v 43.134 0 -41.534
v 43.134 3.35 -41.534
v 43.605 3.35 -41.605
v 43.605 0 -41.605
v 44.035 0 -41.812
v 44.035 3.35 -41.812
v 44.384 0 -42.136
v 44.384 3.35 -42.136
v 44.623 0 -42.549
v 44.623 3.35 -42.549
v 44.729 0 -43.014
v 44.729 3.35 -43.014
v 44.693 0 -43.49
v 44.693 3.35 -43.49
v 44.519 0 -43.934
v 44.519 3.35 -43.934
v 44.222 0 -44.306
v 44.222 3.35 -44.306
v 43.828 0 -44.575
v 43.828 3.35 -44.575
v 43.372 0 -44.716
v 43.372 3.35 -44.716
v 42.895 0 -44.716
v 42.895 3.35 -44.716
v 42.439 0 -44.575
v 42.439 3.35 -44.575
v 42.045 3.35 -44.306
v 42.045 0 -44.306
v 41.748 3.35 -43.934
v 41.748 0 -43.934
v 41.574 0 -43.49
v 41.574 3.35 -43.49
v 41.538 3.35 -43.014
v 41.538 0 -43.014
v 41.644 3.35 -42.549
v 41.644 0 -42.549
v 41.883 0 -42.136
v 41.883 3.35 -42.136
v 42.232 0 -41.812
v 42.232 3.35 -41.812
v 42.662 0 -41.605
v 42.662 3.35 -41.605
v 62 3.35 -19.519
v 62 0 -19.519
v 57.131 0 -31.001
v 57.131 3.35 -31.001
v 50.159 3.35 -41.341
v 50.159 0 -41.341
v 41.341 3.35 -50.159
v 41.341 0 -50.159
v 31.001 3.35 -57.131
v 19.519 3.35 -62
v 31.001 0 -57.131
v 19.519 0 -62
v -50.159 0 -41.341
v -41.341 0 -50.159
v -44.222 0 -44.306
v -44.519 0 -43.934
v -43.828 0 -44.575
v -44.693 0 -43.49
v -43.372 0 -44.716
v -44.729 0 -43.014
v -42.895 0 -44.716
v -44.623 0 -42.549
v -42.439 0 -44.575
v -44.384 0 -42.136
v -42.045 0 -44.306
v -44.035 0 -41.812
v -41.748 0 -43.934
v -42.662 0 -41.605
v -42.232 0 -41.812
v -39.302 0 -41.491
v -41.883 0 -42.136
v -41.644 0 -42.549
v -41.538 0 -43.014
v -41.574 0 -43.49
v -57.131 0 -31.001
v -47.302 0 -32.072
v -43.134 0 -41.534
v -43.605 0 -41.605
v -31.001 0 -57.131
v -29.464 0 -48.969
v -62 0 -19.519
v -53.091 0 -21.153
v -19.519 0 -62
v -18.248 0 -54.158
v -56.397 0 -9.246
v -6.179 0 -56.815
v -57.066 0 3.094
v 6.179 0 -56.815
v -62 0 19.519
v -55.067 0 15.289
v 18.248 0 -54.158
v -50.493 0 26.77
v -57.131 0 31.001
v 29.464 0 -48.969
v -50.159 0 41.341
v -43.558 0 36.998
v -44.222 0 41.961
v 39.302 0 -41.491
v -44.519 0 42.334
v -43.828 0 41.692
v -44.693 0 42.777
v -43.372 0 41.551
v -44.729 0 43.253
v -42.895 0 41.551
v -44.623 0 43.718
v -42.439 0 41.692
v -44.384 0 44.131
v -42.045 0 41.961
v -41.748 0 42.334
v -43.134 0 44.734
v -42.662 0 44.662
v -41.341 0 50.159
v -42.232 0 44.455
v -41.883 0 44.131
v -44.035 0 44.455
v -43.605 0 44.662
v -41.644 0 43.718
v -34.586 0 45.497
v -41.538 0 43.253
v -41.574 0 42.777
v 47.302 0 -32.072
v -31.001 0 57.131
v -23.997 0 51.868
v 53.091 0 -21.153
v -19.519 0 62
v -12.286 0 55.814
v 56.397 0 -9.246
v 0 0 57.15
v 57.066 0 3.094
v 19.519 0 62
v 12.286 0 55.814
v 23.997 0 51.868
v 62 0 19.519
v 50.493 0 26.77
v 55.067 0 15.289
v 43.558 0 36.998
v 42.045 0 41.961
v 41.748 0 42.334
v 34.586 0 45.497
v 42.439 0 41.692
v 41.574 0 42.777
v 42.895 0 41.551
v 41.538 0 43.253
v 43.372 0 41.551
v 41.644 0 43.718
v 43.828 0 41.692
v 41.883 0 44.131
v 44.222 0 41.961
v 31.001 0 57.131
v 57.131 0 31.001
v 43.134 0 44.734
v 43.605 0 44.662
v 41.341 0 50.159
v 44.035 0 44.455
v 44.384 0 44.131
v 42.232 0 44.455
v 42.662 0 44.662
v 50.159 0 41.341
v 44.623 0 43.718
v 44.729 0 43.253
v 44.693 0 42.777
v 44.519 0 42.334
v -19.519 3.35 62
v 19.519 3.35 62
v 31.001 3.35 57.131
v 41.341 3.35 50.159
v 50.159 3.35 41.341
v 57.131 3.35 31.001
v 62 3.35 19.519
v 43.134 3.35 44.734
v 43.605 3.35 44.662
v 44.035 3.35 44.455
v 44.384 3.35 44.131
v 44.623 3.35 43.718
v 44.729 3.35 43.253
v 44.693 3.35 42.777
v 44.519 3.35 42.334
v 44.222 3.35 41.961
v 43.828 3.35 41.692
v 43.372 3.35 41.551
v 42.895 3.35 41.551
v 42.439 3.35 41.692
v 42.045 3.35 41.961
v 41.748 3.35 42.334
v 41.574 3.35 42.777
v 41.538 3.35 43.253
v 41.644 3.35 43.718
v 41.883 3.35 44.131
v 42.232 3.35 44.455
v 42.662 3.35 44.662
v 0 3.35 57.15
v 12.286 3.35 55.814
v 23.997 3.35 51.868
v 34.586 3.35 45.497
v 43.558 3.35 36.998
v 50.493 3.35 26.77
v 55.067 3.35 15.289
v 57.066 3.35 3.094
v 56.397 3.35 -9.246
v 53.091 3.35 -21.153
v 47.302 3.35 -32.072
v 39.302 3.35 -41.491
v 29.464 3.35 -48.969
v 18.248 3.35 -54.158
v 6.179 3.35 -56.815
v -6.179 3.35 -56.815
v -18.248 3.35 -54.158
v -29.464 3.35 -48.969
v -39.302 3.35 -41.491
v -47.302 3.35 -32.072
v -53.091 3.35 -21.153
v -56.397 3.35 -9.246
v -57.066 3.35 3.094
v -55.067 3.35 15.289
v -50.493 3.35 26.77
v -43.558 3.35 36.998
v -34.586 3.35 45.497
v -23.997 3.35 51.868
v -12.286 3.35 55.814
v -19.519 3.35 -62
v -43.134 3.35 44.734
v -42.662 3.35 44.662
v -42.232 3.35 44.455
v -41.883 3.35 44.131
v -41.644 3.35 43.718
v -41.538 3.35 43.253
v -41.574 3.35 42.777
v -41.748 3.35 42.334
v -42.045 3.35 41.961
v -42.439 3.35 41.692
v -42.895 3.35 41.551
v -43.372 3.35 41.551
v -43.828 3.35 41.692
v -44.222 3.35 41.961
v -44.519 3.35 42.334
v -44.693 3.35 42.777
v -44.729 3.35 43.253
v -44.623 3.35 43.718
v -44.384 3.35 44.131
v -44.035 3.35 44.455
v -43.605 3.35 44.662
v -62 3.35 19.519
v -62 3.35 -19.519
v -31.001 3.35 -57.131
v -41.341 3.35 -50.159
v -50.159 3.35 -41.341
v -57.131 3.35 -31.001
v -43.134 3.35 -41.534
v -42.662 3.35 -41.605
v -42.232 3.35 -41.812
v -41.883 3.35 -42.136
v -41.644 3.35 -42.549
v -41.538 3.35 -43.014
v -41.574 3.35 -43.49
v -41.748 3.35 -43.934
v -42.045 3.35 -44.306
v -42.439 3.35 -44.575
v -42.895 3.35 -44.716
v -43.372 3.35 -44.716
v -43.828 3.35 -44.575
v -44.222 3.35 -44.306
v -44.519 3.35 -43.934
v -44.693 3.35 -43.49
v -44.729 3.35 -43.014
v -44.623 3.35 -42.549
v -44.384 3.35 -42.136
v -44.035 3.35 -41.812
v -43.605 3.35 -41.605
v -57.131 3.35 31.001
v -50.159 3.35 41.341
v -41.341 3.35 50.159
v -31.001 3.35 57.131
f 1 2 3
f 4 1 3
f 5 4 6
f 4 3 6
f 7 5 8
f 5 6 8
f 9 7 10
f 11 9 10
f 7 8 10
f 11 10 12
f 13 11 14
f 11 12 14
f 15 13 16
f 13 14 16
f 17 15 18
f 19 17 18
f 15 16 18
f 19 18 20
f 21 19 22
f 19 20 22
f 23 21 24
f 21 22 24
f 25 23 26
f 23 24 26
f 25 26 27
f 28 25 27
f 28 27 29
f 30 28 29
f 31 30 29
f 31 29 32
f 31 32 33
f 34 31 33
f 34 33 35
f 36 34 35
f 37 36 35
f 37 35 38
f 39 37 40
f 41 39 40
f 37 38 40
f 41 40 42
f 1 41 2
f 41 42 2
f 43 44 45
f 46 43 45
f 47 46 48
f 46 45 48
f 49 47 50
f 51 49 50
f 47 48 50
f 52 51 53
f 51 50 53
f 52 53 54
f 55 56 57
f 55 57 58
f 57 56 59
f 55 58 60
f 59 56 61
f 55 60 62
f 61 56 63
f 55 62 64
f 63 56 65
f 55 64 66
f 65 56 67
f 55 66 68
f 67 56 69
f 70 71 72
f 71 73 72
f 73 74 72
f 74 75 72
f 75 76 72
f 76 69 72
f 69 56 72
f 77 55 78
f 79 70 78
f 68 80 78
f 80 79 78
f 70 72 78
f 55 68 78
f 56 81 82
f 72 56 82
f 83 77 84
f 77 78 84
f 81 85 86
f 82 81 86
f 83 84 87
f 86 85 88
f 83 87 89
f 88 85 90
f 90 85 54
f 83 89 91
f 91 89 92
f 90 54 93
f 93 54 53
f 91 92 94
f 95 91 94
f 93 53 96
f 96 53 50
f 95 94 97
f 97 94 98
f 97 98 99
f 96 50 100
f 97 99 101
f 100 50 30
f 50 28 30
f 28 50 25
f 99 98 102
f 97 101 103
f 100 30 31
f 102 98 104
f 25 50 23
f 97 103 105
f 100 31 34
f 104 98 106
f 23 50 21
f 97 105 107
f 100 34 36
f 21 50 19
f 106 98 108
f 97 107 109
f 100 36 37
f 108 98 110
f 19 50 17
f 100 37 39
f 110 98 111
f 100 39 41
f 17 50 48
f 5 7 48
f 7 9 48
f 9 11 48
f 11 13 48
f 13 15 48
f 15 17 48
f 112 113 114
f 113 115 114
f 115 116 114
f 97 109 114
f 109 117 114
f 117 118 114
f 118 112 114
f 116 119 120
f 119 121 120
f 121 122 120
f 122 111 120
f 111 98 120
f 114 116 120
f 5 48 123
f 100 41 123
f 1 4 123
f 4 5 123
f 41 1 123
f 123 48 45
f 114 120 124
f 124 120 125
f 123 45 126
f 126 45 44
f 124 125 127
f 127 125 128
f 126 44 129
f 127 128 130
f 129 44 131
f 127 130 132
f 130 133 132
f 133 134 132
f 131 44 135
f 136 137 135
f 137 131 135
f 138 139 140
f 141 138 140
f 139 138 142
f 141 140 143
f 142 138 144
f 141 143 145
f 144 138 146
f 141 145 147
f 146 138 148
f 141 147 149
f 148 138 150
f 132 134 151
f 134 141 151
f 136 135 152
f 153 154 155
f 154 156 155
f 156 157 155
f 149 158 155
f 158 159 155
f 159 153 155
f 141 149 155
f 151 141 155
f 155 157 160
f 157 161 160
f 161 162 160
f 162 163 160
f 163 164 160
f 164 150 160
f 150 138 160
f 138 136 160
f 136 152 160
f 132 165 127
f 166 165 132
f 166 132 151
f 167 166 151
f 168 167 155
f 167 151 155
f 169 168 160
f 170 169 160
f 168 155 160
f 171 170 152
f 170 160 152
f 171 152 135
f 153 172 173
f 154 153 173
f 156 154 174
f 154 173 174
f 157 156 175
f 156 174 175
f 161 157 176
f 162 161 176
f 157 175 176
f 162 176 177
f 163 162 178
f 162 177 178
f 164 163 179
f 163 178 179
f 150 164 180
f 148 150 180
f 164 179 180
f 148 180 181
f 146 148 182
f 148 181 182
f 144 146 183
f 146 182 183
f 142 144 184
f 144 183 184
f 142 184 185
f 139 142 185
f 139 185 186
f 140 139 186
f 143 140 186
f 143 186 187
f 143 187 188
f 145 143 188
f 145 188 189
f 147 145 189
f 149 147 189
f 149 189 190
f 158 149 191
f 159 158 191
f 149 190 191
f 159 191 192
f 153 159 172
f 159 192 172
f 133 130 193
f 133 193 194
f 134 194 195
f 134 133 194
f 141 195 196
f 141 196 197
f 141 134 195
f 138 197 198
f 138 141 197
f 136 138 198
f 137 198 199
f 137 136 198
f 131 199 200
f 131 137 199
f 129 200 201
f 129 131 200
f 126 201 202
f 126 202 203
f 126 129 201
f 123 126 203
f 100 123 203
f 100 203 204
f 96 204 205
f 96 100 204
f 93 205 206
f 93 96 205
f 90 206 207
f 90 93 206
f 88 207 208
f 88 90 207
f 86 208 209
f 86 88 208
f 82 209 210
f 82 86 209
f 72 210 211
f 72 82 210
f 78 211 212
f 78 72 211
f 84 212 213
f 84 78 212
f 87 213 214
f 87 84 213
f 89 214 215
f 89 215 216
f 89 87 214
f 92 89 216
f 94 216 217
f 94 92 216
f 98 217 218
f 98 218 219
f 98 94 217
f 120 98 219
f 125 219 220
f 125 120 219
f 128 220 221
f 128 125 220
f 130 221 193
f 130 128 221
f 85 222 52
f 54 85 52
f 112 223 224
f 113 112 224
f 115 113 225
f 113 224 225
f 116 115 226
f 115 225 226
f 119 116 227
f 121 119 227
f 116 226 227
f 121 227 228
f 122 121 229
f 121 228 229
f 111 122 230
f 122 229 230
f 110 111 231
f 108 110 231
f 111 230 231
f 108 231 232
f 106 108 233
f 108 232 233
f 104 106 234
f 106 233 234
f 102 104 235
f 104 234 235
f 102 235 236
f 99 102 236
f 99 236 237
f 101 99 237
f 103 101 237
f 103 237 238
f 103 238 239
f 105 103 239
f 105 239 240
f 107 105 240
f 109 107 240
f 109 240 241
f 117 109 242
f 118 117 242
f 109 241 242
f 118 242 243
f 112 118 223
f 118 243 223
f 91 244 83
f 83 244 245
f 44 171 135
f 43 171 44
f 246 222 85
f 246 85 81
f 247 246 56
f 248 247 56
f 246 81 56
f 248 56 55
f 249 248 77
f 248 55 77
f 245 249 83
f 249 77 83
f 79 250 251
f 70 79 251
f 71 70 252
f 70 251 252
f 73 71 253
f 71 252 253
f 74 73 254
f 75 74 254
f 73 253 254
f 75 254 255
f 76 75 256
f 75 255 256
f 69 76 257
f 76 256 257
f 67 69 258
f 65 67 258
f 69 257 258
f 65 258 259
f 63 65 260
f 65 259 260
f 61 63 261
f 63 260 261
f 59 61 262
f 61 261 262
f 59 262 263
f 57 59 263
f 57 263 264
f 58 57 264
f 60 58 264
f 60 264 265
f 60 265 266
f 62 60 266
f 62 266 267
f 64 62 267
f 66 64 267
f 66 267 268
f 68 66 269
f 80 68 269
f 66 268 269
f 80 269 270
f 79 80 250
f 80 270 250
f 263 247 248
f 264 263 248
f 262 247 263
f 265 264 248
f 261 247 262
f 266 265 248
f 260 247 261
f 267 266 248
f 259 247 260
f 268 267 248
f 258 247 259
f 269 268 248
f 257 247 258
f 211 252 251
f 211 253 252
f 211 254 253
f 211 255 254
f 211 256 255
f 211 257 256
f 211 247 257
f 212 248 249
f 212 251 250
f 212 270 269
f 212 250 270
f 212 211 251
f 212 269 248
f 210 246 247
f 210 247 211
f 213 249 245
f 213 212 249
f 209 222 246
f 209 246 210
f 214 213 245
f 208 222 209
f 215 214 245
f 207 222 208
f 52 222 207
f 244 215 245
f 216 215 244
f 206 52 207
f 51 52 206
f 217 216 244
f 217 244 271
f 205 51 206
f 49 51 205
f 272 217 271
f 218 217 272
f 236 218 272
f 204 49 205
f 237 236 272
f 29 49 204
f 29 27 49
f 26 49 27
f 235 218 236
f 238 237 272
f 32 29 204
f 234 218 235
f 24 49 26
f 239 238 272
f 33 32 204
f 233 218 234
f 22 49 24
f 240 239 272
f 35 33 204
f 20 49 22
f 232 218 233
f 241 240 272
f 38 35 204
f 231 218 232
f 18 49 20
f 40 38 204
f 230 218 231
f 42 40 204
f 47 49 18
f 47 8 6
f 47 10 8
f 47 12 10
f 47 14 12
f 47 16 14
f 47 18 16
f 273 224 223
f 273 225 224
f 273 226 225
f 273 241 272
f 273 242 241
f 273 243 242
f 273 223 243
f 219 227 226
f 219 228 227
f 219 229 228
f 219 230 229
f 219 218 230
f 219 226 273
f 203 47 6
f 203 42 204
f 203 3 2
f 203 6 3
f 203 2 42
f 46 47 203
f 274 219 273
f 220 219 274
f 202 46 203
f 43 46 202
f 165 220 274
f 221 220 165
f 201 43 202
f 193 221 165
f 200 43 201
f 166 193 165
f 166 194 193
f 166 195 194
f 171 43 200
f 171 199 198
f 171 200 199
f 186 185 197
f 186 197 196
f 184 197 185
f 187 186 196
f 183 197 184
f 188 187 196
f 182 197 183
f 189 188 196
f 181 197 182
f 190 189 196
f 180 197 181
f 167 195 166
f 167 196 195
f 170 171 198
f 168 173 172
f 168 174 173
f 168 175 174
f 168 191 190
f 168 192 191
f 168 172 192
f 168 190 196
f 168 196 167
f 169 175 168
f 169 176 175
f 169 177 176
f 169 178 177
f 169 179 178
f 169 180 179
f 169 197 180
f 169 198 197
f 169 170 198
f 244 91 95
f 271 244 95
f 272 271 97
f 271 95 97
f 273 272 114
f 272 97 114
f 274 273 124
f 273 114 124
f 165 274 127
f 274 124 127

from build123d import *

# Parameters (mm, degrees)
SKETCH_1_R          = 65
SKETCH_1_R_2        = 57.15
EXTRUDE_1_DEPTH     = 3.35
SKETCH_2_W          = 162.249174321
SKETCH_2_H          = 152.83985105
SKETCH_2_W_2        = 124
SKETCH_2_H_2        = 124
CUT_EXTRUDE_1_DEPTH = 3.35
SKETCH_3_R          = 1.6
CUT_EXTRUDE_2_DEPTH = 3.35


with BuildPart() as part:
    # 草图1 → 凸台-拉伸1 (new body)
    with BuildSketch(Plane(origin=(0, 0, 0), x_dir=(1, 0, 0), z_dir=(0, 1, 0))):
        with Locations(Location((0, 0, 0), (0, 0, 270))):
            Circle(SKETCH_1_R)
        with Locations(Location((0, 0, 0), (0, 0, 270))):
            Circle(SKETCH_1_R_2, mode=Mode.SUBTRACT)
    extrude(amount=EXTRUDE_1_DEPTH)

    # 草图2 → 切除-拉伸1 (cut)
    with BuildSketch(Plane(origin=(0, 3.35, 0), x_dir=(1, 0, 0), z_dir=(0, 1, 0))):
        with Locations((0.017137102, 0)):
            Rectangle(SKETCH_2_W, SKETCH_2_H)
        Rectangle(SKETCH_2_W_2, SKETCH_2_H_2, mode=Mode.SUBTRACT)
    extrude(amount=-CUT_EXTRUDE_1_DEPTH, mode=Mode.SUBTRACT)

    # 草图3 → 切除-拉伸2 (cut)
    with BuildSketch(Plane(origin=(0, 3.35, 0), x_dir=(1, 0, 0), z_dir=(0, 1, 0))):
        with Locations(Location((43.133513652, -43.133513652, 0), (0, 0, 270))):
            Circle(SKETCH_3_R)
        with Locations(Location((-43.133513652, -43.133513652, 0), (0, 0, 270))):
            Circle(SKETCH_3_R)
        with Locations(Location((-43.133513652, 43.133513652, 0), (0, 0, 270))):
            Circle(SKETCH_3_R)
        with Locations(Location((43.133513652, 43.133513652, 0), (0, 0, 270))):
            Circle(SKETCH_3_R)
    extrude(amount=-CUT_EXTRUDE_2_DEPTH, mode=Mode.SUBTRACT)


solid = part.part
